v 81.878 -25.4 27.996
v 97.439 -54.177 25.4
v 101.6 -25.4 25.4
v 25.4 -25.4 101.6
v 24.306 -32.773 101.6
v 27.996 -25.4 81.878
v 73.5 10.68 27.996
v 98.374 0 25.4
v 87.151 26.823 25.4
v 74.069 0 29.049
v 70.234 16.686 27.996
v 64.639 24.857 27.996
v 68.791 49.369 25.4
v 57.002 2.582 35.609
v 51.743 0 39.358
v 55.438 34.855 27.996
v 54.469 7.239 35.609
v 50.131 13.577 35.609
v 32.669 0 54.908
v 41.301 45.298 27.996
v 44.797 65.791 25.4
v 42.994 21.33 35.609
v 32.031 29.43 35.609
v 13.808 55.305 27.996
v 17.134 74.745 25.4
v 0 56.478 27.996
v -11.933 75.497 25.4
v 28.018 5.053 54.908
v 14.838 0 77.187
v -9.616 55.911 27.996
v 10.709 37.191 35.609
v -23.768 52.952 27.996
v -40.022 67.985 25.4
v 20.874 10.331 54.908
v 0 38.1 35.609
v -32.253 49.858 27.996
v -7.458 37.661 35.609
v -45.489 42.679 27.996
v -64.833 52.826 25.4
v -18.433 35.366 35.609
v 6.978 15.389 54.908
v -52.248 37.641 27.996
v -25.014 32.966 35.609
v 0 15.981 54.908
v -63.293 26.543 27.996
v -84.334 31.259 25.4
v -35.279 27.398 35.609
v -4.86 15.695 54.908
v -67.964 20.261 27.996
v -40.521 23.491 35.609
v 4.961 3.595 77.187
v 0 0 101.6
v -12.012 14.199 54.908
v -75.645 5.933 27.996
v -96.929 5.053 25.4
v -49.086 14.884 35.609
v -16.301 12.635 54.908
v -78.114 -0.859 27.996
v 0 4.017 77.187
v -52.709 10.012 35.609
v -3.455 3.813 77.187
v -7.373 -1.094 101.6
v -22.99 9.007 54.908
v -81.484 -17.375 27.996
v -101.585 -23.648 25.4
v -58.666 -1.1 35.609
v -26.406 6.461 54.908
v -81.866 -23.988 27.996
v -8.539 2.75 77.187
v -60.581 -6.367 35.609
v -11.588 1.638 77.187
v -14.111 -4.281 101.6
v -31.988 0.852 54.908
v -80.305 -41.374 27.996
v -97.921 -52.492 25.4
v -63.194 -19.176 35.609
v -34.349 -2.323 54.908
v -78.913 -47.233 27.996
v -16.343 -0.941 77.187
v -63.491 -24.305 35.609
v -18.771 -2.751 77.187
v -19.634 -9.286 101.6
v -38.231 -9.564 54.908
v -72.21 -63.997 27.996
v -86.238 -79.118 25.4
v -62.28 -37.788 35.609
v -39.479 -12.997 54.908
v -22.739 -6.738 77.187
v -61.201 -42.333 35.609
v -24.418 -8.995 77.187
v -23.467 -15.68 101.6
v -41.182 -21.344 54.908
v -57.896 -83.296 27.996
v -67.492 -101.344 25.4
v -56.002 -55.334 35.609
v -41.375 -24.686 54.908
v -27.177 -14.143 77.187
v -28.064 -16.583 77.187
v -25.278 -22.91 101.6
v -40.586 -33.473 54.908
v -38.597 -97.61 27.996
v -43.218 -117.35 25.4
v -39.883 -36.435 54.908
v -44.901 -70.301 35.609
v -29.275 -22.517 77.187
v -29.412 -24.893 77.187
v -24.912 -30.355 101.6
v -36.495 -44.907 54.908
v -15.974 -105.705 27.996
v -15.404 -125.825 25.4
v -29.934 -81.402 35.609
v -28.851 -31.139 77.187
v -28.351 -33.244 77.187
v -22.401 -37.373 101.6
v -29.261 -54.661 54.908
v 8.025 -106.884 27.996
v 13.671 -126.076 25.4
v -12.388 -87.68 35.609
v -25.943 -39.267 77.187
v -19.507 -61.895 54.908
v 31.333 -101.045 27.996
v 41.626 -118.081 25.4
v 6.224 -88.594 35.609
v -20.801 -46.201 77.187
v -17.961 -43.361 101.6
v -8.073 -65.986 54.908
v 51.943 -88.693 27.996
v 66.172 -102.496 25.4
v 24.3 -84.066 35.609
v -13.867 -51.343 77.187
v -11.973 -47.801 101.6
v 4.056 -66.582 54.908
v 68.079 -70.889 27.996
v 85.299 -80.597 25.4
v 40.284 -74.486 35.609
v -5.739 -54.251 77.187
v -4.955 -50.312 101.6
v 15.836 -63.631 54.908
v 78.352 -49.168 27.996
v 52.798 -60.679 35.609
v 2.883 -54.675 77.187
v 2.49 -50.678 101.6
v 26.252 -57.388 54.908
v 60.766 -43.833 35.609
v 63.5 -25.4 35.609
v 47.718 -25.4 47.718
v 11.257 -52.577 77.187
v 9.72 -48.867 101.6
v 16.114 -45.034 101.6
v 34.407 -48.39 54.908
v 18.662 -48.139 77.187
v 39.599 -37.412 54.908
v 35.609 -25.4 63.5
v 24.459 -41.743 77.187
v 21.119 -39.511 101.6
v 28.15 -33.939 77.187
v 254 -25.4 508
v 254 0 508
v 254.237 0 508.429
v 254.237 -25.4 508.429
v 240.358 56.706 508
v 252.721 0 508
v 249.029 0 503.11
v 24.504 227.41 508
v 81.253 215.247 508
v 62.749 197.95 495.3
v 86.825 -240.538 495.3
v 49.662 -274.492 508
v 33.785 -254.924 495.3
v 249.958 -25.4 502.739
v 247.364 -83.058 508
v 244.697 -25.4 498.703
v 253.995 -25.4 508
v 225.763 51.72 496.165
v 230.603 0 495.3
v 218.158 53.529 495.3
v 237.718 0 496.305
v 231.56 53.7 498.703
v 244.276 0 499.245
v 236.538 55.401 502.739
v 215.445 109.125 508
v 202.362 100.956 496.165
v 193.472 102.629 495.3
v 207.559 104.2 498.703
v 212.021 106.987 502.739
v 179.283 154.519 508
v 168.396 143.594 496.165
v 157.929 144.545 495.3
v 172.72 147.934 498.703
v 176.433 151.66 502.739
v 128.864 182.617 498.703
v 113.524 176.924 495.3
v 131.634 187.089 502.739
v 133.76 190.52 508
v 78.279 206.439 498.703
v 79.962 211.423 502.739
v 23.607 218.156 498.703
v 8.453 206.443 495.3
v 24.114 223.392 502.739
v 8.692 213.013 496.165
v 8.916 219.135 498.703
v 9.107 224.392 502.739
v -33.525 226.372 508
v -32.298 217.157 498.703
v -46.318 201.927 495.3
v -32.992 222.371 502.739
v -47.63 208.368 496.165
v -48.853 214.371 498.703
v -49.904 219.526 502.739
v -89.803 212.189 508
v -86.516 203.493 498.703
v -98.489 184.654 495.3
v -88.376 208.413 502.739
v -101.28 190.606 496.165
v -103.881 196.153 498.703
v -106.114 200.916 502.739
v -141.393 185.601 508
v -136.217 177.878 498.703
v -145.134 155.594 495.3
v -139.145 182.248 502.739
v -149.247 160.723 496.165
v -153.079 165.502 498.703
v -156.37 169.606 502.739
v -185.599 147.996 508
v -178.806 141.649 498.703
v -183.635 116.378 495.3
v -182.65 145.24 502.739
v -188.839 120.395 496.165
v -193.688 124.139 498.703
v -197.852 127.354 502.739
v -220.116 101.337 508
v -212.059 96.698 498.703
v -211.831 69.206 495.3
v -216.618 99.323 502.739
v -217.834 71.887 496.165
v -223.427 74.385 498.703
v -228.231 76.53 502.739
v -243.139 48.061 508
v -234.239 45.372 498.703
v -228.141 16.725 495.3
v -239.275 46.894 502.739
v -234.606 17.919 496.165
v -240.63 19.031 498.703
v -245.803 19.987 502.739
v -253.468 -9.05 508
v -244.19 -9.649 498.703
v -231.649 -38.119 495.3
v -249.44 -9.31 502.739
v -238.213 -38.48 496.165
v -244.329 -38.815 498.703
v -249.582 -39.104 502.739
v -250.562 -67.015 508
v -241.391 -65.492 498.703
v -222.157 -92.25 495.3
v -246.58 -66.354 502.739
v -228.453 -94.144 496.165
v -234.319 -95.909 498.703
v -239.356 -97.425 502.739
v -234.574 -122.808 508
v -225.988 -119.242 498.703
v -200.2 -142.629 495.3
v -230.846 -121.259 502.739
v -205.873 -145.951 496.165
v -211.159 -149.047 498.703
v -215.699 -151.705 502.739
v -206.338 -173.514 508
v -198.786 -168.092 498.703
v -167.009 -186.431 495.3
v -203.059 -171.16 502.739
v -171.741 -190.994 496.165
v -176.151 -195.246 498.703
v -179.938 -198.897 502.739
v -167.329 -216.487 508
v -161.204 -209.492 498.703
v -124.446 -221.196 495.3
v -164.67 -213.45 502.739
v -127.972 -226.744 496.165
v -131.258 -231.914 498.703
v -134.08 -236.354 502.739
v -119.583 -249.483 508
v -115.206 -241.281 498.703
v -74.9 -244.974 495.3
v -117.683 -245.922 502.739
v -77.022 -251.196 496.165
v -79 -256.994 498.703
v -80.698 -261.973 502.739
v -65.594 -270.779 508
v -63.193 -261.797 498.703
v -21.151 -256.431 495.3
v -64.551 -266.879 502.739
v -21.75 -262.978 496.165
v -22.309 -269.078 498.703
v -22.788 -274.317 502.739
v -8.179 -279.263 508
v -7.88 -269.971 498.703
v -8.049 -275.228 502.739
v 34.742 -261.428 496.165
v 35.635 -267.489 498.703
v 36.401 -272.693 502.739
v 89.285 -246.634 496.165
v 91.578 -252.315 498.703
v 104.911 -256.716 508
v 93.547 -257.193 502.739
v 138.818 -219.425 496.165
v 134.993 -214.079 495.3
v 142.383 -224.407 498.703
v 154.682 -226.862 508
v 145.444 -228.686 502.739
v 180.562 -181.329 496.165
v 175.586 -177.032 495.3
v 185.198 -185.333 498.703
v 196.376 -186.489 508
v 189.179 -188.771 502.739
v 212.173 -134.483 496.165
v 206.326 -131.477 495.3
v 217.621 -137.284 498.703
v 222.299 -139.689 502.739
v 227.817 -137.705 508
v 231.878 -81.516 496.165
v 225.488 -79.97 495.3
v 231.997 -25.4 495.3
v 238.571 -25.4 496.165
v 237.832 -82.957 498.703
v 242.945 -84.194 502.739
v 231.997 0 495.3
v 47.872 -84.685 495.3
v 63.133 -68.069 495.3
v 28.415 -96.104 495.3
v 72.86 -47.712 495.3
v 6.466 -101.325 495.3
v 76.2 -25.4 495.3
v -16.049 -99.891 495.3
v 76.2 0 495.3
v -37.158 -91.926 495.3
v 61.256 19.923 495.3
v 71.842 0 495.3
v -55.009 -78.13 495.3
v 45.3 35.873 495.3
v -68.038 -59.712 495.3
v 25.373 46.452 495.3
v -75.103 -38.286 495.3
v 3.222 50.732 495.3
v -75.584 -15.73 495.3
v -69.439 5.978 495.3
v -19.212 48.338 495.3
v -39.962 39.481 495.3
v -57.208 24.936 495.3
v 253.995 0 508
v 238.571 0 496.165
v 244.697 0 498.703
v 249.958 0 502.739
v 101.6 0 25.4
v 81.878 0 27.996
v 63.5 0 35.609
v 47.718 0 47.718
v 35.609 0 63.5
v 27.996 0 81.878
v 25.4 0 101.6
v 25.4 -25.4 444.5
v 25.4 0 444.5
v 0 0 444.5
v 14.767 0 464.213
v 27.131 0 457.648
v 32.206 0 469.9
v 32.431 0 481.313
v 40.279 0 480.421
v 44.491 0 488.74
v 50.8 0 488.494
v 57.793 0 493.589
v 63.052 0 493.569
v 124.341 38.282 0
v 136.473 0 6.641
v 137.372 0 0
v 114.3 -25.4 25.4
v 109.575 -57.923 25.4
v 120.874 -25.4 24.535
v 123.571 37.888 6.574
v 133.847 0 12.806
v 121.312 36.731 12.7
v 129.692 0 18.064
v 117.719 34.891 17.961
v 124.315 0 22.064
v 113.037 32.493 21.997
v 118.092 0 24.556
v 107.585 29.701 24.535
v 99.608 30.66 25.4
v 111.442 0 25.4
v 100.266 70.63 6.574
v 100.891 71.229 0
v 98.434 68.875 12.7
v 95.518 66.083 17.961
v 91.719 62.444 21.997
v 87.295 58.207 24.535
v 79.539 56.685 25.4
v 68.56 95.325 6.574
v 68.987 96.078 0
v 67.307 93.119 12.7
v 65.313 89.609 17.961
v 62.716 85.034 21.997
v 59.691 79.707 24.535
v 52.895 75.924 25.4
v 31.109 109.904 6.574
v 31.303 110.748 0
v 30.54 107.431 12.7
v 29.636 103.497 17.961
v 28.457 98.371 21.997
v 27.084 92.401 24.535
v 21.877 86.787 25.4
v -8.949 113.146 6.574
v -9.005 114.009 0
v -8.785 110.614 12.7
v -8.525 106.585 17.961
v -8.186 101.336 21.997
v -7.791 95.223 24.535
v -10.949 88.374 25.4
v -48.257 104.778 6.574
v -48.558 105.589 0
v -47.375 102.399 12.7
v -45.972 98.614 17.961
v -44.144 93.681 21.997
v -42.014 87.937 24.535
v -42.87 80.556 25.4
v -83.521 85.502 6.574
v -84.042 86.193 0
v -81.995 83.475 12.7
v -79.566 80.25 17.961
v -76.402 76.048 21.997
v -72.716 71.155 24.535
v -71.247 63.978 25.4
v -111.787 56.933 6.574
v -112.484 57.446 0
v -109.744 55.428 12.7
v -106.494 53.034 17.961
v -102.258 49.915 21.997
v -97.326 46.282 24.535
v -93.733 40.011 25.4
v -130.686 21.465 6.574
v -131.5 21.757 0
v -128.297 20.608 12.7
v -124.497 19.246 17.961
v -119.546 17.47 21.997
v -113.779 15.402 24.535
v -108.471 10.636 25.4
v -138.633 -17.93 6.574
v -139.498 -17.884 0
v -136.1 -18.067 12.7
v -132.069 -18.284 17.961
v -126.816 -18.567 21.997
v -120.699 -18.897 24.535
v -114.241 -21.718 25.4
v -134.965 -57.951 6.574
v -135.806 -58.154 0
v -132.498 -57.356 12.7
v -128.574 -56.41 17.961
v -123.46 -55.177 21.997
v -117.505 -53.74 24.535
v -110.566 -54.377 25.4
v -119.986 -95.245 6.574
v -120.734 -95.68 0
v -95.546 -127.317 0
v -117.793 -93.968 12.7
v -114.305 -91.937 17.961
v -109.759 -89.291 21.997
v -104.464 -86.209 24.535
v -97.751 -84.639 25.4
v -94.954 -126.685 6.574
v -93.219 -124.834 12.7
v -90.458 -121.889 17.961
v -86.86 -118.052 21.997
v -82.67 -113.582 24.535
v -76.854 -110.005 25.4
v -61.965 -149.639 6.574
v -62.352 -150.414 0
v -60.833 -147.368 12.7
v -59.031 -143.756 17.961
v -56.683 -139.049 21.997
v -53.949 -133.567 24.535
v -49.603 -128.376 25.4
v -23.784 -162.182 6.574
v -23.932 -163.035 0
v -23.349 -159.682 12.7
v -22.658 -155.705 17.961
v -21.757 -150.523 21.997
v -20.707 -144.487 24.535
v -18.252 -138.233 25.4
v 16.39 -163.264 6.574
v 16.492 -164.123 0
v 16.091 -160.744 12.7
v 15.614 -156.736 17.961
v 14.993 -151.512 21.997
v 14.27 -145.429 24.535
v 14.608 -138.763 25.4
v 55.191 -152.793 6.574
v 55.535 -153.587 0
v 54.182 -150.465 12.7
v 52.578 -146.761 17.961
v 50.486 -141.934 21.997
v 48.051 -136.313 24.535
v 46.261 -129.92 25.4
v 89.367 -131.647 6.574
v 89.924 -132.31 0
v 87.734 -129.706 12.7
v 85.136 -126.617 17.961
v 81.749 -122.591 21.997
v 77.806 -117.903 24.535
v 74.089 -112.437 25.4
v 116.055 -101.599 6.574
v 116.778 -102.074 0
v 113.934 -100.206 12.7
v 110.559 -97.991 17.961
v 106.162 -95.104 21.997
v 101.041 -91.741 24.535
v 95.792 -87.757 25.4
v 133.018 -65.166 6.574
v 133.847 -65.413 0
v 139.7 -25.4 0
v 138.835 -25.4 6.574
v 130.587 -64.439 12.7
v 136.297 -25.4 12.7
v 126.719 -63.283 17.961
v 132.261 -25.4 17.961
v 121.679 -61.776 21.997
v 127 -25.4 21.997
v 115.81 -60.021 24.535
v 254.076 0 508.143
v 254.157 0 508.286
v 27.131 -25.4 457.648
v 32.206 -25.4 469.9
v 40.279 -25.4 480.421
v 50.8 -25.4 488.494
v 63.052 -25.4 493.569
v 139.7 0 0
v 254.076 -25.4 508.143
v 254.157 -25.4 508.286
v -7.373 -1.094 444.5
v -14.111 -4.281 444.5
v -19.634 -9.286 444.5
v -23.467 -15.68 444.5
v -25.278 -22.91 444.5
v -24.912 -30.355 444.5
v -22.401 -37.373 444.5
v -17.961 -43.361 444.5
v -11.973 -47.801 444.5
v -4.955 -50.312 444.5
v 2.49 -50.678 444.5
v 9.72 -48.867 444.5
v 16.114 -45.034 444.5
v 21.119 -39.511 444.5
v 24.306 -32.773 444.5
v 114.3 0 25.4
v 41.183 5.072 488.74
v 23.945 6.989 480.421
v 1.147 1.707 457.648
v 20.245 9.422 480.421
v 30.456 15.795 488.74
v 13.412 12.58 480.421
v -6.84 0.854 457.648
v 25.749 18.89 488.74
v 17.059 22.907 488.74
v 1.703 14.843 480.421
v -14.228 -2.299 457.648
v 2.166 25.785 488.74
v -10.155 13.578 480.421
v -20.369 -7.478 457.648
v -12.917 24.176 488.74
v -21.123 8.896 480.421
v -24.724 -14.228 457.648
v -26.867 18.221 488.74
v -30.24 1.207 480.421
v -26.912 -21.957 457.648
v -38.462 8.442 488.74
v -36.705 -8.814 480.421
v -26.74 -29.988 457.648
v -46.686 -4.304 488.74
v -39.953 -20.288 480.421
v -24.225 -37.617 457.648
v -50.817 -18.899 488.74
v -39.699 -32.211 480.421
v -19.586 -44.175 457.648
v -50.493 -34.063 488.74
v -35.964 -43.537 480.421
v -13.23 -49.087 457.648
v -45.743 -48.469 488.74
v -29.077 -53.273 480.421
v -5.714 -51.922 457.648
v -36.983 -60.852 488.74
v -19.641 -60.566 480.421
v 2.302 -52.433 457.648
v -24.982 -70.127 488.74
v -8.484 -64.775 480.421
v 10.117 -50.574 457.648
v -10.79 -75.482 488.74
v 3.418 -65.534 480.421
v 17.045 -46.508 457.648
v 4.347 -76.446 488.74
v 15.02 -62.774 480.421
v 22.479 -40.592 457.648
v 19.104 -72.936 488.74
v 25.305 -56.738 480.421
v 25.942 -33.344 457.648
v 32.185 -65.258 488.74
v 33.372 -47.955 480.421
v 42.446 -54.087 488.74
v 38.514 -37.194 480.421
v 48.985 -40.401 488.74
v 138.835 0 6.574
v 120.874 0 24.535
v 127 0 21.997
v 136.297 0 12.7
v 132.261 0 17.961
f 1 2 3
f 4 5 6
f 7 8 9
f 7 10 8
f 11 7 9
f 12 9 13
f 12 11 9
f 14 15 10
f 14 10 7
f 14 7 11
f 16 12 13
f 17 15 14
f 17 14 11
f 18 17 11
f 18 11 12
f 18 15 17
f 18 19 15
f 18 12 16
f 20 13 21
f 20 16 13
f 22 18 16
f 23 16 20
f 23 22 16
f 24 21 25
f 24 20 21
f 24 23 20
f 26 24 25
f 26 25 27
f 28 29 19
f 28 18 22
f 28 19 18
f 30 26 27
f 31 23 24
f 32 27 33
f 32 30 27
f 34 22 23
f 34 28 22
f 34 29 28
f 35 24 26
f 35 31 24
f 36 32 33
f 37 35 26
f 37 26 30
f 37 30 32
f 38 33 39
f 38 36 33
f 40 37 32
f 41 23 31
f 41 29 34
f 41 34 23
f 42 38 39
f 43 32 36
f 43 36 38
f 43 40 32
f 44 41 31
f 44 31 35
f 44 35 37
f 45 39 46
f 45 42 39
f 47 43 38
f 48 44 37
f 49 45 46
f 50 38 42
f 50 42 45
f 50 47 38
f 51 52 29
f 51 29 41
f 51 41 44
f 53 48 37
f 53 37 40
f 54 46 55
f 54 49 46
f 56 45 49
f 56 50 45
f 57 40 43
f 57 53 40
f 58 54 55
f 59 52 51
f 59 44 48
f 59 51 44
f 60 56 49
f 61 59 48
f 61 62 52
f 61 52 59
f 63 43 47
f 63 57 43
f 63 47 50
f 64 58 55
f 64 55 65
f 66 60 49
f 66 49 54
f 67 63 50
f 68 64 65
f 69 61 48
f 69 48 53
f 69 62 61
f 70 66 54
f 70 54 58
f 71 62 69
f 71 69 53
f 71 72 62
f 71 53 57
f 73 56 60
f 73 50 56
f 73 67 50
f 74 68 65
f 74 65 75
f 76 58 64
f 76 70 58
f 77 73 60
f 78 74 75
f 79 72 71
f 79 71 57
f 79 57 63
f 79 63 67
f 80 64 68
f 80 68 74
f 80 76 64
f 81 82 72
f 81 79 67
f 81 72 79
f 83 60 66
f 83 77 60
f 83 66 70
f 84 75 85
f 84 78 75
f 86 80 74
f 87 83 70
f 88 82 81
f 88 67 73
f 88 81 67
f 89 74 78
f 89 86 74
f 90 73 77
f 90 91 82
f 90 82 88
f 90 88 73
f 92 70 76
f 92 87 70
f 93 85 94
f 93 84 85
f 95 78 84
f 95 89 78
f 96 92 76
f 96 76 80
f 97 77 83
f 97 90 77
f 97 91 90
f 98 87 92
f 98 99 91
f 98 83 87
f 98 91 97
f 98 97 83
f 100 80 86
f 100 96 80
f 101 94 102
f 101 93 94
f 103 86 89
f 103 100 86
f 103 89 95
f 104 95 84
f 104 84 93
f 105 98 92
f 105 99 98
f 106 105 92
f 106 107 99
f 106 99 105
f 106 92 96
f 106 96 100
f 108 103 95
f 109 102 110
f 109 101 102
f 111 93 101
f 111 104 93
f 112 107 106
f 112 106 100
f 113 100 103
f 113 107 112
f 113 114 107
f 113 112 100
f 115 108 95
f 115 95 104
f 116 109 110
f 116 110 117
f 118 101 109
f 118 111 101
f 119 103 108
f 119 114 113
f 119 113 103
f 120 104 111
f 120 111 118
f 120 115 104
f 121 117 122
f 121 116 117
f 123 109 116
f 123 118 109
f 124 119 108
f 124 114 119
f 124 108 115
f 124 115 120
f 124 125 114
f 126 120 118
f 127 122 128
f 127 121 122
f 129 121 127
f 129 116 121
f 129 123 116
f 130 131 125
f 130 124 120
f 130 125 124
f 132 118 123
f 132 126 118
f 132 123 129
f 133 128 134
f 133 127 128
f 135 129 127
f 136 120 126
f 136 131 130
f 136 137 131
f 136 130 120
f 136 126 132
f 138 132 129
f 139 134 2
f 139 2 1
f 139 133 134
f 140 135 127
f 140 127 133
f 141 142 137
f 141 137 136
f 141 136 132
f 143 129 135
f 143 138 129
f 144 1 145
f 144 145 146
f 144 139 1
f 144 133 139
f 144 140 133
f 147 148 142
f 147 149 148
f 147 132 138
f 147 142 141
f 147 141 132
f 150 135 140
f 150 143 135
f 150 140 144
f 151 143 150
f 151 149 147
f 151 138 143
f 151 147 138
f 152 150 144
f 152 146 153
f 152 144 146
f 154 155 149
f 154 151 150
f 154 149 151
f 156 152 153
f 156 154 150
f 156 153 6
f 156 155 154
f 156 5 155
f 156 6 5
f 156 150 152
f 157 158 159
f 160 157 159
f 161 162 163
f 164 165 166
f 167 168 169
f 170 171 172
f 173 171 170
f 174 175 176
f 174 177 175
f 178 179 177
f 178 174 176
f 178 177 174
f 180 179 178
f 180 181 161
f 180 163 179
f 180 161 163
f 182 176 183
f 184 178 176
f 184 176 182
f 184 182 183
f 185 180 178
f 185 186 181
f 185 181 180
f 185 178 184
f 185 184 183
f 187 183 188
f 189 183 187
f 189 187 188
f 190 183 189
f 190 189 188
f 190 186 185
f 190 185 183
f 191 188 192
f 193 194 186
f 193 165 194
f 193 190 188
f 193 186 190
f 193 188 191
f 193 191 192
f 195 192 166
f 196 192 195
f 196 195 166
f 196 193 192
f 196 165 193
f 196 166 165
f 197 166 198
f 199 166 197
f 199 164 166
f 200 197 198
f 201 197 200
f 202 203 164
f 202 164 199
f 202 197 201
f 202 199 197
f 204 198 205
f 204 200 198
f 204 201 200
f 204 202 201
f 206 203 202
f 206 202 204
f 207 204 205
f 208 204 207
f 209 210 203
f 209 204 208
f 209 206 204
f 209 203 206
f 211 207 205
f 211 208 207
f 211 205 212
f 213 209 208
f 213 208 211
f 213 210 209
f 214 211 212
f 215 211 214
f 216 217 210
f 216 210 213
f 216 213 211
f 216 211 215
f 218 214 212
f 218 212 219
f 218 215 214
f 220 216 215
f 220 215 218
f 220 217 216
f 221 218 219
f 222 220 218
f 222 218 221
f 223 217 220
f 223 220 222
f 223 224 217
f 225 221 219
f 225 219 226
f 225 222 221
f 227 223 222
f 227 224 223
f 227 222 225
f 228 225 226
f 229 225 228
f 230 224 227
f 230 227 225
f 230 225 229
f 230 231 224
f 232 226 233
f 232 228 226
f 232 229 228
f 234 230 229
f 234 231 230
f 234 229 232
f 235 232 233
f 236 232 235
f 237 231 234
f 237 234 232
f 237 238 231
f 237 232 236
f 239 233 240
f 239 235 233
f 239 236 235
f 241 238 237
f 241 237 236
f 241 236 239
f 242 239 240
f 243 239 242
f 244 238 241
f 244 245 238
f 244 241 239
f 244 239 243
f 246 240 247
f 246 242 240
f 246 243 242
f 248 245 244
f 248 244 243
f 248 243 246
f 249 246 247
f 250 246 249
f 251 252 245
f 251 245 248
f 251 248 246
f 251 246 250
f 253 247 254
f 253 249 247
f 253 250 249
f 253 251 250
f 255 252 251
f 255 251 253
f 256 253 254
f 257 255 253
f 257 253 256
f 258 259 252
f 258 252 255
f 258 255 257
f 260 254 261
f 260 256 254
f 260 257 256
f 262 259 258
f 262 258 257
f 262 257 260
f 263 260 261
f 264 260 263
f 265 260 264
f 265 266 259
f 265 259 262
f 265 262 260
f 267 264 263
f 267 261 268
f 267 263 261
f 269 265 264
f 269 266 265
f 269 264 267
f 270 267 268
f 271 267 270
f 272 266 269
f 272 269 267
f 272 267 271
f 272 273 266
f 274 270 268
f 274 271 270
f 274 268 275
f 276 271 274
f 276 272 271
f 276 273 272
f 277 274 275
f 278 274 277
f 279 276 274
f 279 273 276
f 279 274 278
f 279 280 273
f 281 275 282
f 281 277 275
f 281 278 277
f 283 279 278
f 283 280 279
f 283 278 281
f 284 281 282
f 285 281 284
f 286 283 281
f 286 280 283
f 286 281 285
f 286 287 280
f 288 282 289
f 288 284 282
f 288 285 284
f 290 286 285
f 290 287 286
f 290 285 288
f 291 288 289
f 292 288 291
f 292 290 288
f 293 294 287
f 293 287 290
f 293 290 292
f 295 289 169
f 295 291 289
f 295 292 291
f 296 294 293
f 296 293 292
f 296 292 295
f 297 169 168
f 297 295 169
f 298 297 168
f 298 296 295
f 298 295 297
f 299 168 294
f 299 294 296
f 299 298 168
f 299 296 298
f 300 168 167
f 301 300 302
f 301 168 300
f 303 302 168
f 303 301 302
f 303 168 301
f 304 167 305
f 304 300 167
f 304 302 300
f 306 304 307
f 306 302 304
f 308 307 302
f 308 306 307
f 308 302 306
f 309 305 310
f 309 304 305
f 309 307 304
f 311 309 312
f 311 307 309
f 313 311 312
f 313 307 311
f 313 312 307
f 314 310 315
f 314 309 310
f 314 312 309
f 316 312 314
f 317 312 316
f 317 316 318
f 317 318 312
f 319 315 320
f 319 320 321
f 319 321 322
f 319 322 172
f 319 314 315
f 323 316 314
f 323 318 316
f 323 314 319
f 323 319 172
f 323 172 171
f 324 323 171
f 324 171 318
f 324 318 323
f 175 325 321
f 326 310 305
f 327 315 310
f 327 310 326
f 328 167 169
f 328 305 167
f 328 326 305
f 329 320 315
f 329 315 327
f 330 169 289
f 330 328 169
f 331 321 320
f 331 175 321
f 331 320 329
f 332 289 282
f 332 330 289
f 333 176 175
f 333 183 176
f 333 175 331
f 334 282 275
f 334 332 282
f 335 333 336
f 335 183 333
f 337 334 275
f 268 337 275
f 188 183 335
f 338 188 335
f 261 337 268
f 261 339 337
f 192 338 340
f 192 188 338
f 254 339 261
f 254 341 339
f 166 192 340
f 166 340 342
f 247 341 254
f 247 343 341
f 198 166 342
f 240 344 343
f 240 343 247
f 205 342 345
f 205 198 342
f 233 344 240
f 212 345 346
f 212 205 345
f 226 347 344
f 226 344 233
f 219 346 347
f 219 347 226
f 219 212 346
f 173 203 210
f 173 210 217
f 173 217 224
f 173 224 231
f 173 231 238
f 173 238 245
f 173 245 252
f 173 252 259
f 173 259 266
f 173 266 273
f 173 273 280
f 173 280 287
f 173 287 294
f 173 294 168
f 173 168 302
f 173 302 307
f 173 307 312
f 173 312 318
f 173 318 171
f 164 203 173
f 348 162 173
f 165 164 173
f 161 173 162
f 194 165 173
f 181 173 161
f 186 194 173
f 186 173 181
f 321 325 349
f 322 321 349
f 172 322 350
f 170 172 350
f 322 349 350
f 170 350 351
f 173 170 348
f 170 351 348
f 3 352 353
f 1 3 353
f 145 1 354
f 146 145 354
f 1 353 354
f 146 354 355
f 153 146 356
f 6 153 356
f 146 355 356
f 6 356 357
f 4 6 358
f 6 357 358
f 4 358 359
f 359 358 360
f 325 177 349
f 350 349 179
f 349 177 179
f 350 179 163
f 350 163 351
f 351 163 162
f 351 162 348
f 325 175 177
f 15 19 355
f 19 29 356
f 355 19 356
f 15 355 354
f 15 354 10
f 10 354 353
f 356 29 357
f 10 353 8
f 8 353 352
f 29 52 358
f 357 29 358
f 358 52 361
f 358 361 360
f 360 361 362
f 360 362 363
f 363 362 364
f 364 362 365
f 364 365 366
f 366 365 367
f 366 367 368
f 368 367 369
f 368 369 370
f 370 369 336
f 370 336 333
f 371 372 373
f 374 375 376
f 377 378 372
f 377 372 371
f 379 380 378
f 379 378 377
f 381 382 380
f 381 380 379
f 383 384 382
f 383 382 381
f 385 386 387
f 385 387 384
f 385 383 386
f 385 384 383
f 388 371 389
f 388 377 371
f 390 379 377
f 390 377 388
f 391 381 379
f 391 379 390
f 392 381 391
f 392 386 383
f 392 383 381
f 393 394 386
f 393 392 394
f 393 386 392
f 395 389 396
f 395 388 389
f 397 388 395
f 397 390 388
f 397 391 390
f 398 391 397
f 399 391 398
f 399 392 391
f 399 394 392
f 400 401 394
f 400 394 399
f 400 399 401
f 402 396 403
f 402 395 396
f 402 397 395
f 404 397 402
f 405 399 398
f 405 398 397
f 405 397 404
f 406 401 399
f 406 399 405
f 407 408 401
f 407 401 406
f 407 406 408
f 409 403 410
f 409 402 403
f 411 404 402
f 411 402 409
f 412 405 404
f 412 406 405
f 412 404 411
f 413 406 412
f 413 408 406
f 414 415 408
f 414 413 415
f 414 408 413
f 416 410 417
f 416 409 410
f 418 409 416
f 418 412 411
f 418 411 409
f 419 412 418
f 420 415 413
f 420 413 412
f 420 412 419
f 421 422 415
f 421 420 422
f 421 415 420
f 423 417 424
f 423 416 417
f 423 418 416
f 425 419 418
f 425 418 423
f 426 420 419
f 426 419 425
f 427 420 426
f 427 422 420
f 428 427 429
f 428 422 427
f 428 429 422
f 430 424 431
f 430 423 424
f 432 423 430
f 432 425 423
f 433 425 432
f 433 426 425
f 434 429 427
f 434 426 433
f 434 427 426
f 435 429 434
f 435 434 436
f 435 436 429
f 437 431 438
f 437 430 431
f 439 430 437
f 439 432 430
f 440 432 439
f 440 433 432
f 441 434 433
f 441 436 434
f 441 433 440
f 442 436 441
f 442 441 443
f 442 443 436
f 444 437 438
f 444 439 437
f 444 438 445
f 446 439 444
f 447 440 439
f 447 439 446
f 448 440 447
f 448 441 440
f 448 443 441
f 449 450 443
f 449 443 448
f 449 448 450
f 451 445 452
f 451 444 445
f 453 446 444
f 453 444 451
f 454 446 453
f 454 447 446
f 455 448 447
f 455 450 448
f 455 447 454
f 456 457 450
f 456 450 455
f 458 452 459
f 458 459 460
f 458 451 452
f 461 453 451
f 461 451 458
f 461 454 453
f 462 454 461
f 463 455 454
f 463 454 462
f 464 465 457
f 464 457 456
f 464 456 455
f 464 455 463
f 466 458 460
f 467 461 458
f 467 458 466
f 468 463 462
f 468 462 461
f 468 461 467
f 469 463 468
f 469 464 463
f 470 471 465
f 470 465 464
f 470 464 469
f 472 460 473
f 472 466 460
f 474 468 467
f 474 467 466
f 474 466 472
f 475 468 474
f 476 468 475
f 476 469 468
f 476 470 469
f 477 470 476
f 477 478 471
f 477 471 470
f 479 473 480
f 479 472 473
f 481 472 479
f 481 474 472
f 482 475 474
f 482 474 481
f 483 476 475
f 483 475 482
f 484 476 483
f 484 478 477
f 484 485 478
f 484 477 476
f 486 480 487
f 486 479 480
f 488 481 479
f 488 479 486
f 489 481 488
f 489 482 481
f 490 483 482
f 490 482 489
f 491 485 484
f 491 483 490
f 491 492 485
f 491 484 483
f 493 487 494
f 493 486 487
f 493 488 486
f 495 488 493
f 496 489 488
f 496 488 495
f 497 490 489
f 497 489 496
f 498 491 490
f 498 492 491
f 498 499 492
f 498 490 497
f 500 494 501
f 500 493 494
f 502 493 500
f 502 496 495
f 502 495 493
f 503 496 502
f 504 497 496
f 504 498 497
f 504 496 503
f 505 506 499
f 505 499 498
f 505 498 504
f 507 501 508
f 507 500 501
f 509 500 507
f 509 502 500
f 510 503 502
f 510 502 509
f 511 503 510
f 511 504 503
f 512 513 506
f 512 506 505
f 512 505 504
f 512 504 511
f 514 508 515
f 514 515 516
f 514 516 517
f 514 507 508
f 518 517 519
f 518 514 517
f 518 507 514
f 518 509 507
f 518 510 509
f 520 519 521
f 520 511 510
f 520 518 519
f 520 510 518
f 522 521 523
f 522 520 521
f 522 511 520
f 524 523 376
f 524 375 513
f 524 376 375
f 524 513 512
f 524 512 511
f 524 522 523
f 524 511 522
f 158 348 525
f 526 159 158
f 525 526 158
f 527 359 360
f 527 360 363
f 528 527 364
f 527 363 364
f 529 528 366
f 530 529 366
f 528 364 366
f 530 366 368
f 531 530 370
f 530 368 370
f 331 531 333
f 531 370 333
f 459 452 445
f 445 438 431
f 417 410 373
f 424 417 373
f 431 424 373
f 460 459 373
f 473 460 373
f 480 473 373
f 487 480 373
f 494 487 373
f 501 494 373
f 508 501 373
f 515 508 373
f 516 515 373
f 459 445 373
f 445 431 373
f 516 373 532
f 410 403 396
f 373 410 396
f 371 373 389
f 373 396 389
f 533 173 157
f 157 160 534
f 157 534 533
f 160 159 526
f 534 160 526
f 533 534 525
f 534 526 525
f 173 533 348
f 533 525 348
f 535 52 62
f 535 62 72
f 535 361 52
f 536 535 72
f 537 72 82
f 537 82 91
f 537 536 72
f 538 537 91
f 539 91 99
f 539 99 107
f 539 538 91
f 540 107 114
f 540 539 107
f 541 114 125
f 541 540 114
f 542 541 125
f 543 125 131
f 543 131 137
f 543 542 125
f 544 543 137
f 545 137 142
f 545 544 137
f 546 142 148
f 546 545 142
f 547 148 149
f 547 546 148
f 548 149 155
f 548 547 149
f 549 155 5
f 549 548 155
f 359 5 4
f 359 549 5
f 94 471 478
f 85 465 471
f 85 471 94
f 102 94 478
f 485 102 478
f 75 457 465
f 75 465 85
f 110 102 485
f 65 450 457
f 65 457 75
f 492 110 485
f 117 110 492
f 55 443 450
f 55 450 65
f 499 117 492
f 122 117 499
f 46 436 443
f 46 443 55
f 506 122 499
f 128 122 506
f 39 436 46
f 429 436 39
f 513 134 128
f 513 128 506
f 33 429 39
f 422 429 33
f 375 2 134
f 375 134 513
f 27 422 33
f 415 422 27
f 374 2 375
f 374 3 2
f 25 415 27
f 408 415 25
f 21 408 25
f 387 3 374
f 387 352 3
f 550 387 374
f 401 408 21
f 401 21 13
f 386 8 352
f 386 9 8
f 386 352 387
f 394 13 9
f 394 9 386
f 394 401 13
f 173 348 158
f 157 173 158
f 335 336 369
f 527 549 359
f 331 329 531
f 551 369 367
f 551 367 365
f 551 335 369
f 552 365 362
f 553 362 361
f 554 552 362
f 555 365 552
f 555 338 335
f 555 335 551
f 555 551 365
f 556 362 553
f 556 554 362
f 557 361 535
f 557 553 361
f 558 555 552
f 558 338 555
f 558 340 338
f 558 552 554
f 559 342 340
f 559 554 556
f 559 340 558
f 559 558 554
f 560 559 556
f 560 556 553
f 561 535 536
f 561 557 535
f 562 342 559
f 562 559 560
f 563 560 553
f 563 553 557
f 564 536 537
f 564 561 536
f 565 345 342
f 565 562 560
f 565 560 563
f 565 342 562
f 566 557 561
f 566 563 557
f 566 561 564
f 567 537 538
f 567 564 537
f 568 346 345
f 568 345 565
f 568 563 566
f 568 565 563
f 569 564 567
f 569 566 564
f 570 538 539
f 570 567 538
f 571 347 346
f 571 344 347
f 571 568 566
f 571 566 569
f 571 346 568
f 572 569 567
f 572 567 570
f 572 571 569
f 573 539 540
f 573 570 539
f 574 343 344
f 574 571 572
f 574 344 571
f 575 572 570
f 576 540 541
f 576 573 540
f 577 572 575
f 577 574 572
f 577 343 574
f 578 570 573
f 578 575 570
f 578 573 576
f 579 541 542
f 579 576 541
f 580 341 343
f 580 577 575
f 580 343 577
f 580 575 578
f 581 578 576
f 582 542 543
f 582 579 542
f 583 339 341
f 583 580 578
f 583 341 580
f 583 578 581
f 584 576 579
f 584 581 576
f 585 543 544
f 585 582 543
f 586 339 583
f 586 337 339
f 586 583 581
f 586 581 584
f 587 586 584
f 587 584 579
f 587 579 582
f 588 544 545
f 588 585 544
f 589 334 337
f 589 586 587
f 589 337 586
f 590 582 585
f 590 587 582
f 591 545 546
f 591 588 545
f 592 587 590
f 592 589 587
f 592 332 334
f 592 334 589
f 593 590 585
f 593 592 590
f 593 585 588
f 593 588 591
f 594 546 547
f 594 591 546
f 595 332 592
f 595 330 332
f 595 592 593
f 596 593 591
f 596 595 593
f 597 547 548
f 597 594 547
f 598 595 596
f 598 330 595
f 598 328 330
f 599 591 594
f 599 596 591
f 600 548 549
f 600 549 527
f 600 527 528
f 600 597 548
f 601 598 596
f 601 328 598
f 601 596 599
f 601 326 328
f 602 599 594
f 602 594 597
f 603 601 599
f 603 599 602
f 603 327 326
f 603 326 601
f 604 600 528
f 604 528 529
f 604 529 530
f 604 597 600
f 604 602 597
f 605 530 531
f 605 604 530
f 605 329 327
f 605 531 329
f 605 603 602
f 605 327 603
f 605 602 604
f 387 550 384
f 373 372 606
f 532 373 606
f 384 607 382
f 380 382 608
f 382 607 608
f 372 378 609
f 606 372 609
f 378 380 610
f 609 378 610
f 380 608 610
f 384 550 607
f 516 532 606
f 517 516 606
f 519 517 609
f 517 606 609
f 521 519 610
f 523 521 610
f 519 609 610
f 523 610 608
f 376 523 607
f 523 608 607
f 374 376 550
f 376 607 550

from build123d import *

# Parameters (mm, degrees)
F1_DEPTH = 25.4


with BuildPart() as f1:
    # F0 (on Front) → F1 (new body)
    with BuildSketch(Plane.XZ):
        with BuildLine():
            Line((0, 508), (0, 0))
            Line((0, 0), (139.7, 0))
            ThreePointArc((139.7, 0), (132.2605122421, 17.9605122421), (114.3, 25.4))
            Line((114.3, 25.4), (101.6, 25.4))
            ThreePointArc((101.6, 25.4), (47.7184632736, 47.7184632736), (25.4, 101.6))
            Line((25.4, 101.6), (25.4, 444.5))
            ThreePointArc((25.4, 444.5), (40.2789755157, 480.4210244843), (76.2, 495.3))
            Line((76.2, 495.3), (231.9974913336, 495.3))
            ThreePointArc((231.9974913336, 495.3), (244.6974913336, 498.7029547439), (253.9945365897, 508))
            Line((253.9945365897, 508), (0, 508))
        make_face()
    extrude(amount=F1_DEPTH)



with BuildPart() as f1b:
    # F0 (on Front) → F1, piece 2 (new body)
    with BuildSketch(Plane.XZ):
        with BuildLine():
            ThreePointArc((254.2368602746, 508.4292840834), (254.1167398846, 508.2140541592), (253.9945365897, 508))
            Line((253.9945365897, 508), (254, 508))
            Line((254, 508), (254.2368602746, 508.4292840834))
        make_face()
    extrude(amount=F1_DEPTH)


with BuildPart() as f1_1:
    add(f1.part)

    add(f1b.part)  # F2 merges F1b
    # F1_face (on face) → F2 (revolve)
    with BuildSketch(Plane(origin=(41.5744005551, -25.4, 248.8086421529), x_dir=(1, 0, 0), z_dir=(0, -1, 0))):
        with BuildLine():
            Line((212.4201360347, 259.1913578471), (-41.5744005551, 259.1913578471))
            Line((-41.5744005551, 259.1913578471), (-41.5744005551, -248.8086421529))
            Line((-41.5744005551, -248.8086421529), (98.1255994449, -248.8086421529))
            ThreePointArc((98.1255994449, -248.8086421529), (90.686111687, -230.8481299108), (72.7255994449, -223.4086421529))
            Line((72.7255994449, -223.4086421529), (60.0255994449, -223.4086421529))
            ThreePointArc((60.0255994449, -223.4086421529), (6.1440627185, -201.0901788793), (-16.1744005551, -147.2086421529))
            Line((-16.1744005551, -147.2086421529), (-16.1744005551, 195.6913578471))
            ThreePointArc((-16.1744005551, 195.6913578471), (-1.2954250394, 231.6123823314), (34.6255994449, 246.4913578471))
            Line((34.6255994449, 246.4913578471), (190.4230907785, 246.4913578471))
            ThreePointArc((190.4230907785, 246.4913578471), (203.1230907785, 249.894312591), (212.4201360347, 259.1913578471))
        make_face()
    revolve(axis=Axis((0, -25.4, 254), (0, 0, 1)))


solid = f1_1.part
